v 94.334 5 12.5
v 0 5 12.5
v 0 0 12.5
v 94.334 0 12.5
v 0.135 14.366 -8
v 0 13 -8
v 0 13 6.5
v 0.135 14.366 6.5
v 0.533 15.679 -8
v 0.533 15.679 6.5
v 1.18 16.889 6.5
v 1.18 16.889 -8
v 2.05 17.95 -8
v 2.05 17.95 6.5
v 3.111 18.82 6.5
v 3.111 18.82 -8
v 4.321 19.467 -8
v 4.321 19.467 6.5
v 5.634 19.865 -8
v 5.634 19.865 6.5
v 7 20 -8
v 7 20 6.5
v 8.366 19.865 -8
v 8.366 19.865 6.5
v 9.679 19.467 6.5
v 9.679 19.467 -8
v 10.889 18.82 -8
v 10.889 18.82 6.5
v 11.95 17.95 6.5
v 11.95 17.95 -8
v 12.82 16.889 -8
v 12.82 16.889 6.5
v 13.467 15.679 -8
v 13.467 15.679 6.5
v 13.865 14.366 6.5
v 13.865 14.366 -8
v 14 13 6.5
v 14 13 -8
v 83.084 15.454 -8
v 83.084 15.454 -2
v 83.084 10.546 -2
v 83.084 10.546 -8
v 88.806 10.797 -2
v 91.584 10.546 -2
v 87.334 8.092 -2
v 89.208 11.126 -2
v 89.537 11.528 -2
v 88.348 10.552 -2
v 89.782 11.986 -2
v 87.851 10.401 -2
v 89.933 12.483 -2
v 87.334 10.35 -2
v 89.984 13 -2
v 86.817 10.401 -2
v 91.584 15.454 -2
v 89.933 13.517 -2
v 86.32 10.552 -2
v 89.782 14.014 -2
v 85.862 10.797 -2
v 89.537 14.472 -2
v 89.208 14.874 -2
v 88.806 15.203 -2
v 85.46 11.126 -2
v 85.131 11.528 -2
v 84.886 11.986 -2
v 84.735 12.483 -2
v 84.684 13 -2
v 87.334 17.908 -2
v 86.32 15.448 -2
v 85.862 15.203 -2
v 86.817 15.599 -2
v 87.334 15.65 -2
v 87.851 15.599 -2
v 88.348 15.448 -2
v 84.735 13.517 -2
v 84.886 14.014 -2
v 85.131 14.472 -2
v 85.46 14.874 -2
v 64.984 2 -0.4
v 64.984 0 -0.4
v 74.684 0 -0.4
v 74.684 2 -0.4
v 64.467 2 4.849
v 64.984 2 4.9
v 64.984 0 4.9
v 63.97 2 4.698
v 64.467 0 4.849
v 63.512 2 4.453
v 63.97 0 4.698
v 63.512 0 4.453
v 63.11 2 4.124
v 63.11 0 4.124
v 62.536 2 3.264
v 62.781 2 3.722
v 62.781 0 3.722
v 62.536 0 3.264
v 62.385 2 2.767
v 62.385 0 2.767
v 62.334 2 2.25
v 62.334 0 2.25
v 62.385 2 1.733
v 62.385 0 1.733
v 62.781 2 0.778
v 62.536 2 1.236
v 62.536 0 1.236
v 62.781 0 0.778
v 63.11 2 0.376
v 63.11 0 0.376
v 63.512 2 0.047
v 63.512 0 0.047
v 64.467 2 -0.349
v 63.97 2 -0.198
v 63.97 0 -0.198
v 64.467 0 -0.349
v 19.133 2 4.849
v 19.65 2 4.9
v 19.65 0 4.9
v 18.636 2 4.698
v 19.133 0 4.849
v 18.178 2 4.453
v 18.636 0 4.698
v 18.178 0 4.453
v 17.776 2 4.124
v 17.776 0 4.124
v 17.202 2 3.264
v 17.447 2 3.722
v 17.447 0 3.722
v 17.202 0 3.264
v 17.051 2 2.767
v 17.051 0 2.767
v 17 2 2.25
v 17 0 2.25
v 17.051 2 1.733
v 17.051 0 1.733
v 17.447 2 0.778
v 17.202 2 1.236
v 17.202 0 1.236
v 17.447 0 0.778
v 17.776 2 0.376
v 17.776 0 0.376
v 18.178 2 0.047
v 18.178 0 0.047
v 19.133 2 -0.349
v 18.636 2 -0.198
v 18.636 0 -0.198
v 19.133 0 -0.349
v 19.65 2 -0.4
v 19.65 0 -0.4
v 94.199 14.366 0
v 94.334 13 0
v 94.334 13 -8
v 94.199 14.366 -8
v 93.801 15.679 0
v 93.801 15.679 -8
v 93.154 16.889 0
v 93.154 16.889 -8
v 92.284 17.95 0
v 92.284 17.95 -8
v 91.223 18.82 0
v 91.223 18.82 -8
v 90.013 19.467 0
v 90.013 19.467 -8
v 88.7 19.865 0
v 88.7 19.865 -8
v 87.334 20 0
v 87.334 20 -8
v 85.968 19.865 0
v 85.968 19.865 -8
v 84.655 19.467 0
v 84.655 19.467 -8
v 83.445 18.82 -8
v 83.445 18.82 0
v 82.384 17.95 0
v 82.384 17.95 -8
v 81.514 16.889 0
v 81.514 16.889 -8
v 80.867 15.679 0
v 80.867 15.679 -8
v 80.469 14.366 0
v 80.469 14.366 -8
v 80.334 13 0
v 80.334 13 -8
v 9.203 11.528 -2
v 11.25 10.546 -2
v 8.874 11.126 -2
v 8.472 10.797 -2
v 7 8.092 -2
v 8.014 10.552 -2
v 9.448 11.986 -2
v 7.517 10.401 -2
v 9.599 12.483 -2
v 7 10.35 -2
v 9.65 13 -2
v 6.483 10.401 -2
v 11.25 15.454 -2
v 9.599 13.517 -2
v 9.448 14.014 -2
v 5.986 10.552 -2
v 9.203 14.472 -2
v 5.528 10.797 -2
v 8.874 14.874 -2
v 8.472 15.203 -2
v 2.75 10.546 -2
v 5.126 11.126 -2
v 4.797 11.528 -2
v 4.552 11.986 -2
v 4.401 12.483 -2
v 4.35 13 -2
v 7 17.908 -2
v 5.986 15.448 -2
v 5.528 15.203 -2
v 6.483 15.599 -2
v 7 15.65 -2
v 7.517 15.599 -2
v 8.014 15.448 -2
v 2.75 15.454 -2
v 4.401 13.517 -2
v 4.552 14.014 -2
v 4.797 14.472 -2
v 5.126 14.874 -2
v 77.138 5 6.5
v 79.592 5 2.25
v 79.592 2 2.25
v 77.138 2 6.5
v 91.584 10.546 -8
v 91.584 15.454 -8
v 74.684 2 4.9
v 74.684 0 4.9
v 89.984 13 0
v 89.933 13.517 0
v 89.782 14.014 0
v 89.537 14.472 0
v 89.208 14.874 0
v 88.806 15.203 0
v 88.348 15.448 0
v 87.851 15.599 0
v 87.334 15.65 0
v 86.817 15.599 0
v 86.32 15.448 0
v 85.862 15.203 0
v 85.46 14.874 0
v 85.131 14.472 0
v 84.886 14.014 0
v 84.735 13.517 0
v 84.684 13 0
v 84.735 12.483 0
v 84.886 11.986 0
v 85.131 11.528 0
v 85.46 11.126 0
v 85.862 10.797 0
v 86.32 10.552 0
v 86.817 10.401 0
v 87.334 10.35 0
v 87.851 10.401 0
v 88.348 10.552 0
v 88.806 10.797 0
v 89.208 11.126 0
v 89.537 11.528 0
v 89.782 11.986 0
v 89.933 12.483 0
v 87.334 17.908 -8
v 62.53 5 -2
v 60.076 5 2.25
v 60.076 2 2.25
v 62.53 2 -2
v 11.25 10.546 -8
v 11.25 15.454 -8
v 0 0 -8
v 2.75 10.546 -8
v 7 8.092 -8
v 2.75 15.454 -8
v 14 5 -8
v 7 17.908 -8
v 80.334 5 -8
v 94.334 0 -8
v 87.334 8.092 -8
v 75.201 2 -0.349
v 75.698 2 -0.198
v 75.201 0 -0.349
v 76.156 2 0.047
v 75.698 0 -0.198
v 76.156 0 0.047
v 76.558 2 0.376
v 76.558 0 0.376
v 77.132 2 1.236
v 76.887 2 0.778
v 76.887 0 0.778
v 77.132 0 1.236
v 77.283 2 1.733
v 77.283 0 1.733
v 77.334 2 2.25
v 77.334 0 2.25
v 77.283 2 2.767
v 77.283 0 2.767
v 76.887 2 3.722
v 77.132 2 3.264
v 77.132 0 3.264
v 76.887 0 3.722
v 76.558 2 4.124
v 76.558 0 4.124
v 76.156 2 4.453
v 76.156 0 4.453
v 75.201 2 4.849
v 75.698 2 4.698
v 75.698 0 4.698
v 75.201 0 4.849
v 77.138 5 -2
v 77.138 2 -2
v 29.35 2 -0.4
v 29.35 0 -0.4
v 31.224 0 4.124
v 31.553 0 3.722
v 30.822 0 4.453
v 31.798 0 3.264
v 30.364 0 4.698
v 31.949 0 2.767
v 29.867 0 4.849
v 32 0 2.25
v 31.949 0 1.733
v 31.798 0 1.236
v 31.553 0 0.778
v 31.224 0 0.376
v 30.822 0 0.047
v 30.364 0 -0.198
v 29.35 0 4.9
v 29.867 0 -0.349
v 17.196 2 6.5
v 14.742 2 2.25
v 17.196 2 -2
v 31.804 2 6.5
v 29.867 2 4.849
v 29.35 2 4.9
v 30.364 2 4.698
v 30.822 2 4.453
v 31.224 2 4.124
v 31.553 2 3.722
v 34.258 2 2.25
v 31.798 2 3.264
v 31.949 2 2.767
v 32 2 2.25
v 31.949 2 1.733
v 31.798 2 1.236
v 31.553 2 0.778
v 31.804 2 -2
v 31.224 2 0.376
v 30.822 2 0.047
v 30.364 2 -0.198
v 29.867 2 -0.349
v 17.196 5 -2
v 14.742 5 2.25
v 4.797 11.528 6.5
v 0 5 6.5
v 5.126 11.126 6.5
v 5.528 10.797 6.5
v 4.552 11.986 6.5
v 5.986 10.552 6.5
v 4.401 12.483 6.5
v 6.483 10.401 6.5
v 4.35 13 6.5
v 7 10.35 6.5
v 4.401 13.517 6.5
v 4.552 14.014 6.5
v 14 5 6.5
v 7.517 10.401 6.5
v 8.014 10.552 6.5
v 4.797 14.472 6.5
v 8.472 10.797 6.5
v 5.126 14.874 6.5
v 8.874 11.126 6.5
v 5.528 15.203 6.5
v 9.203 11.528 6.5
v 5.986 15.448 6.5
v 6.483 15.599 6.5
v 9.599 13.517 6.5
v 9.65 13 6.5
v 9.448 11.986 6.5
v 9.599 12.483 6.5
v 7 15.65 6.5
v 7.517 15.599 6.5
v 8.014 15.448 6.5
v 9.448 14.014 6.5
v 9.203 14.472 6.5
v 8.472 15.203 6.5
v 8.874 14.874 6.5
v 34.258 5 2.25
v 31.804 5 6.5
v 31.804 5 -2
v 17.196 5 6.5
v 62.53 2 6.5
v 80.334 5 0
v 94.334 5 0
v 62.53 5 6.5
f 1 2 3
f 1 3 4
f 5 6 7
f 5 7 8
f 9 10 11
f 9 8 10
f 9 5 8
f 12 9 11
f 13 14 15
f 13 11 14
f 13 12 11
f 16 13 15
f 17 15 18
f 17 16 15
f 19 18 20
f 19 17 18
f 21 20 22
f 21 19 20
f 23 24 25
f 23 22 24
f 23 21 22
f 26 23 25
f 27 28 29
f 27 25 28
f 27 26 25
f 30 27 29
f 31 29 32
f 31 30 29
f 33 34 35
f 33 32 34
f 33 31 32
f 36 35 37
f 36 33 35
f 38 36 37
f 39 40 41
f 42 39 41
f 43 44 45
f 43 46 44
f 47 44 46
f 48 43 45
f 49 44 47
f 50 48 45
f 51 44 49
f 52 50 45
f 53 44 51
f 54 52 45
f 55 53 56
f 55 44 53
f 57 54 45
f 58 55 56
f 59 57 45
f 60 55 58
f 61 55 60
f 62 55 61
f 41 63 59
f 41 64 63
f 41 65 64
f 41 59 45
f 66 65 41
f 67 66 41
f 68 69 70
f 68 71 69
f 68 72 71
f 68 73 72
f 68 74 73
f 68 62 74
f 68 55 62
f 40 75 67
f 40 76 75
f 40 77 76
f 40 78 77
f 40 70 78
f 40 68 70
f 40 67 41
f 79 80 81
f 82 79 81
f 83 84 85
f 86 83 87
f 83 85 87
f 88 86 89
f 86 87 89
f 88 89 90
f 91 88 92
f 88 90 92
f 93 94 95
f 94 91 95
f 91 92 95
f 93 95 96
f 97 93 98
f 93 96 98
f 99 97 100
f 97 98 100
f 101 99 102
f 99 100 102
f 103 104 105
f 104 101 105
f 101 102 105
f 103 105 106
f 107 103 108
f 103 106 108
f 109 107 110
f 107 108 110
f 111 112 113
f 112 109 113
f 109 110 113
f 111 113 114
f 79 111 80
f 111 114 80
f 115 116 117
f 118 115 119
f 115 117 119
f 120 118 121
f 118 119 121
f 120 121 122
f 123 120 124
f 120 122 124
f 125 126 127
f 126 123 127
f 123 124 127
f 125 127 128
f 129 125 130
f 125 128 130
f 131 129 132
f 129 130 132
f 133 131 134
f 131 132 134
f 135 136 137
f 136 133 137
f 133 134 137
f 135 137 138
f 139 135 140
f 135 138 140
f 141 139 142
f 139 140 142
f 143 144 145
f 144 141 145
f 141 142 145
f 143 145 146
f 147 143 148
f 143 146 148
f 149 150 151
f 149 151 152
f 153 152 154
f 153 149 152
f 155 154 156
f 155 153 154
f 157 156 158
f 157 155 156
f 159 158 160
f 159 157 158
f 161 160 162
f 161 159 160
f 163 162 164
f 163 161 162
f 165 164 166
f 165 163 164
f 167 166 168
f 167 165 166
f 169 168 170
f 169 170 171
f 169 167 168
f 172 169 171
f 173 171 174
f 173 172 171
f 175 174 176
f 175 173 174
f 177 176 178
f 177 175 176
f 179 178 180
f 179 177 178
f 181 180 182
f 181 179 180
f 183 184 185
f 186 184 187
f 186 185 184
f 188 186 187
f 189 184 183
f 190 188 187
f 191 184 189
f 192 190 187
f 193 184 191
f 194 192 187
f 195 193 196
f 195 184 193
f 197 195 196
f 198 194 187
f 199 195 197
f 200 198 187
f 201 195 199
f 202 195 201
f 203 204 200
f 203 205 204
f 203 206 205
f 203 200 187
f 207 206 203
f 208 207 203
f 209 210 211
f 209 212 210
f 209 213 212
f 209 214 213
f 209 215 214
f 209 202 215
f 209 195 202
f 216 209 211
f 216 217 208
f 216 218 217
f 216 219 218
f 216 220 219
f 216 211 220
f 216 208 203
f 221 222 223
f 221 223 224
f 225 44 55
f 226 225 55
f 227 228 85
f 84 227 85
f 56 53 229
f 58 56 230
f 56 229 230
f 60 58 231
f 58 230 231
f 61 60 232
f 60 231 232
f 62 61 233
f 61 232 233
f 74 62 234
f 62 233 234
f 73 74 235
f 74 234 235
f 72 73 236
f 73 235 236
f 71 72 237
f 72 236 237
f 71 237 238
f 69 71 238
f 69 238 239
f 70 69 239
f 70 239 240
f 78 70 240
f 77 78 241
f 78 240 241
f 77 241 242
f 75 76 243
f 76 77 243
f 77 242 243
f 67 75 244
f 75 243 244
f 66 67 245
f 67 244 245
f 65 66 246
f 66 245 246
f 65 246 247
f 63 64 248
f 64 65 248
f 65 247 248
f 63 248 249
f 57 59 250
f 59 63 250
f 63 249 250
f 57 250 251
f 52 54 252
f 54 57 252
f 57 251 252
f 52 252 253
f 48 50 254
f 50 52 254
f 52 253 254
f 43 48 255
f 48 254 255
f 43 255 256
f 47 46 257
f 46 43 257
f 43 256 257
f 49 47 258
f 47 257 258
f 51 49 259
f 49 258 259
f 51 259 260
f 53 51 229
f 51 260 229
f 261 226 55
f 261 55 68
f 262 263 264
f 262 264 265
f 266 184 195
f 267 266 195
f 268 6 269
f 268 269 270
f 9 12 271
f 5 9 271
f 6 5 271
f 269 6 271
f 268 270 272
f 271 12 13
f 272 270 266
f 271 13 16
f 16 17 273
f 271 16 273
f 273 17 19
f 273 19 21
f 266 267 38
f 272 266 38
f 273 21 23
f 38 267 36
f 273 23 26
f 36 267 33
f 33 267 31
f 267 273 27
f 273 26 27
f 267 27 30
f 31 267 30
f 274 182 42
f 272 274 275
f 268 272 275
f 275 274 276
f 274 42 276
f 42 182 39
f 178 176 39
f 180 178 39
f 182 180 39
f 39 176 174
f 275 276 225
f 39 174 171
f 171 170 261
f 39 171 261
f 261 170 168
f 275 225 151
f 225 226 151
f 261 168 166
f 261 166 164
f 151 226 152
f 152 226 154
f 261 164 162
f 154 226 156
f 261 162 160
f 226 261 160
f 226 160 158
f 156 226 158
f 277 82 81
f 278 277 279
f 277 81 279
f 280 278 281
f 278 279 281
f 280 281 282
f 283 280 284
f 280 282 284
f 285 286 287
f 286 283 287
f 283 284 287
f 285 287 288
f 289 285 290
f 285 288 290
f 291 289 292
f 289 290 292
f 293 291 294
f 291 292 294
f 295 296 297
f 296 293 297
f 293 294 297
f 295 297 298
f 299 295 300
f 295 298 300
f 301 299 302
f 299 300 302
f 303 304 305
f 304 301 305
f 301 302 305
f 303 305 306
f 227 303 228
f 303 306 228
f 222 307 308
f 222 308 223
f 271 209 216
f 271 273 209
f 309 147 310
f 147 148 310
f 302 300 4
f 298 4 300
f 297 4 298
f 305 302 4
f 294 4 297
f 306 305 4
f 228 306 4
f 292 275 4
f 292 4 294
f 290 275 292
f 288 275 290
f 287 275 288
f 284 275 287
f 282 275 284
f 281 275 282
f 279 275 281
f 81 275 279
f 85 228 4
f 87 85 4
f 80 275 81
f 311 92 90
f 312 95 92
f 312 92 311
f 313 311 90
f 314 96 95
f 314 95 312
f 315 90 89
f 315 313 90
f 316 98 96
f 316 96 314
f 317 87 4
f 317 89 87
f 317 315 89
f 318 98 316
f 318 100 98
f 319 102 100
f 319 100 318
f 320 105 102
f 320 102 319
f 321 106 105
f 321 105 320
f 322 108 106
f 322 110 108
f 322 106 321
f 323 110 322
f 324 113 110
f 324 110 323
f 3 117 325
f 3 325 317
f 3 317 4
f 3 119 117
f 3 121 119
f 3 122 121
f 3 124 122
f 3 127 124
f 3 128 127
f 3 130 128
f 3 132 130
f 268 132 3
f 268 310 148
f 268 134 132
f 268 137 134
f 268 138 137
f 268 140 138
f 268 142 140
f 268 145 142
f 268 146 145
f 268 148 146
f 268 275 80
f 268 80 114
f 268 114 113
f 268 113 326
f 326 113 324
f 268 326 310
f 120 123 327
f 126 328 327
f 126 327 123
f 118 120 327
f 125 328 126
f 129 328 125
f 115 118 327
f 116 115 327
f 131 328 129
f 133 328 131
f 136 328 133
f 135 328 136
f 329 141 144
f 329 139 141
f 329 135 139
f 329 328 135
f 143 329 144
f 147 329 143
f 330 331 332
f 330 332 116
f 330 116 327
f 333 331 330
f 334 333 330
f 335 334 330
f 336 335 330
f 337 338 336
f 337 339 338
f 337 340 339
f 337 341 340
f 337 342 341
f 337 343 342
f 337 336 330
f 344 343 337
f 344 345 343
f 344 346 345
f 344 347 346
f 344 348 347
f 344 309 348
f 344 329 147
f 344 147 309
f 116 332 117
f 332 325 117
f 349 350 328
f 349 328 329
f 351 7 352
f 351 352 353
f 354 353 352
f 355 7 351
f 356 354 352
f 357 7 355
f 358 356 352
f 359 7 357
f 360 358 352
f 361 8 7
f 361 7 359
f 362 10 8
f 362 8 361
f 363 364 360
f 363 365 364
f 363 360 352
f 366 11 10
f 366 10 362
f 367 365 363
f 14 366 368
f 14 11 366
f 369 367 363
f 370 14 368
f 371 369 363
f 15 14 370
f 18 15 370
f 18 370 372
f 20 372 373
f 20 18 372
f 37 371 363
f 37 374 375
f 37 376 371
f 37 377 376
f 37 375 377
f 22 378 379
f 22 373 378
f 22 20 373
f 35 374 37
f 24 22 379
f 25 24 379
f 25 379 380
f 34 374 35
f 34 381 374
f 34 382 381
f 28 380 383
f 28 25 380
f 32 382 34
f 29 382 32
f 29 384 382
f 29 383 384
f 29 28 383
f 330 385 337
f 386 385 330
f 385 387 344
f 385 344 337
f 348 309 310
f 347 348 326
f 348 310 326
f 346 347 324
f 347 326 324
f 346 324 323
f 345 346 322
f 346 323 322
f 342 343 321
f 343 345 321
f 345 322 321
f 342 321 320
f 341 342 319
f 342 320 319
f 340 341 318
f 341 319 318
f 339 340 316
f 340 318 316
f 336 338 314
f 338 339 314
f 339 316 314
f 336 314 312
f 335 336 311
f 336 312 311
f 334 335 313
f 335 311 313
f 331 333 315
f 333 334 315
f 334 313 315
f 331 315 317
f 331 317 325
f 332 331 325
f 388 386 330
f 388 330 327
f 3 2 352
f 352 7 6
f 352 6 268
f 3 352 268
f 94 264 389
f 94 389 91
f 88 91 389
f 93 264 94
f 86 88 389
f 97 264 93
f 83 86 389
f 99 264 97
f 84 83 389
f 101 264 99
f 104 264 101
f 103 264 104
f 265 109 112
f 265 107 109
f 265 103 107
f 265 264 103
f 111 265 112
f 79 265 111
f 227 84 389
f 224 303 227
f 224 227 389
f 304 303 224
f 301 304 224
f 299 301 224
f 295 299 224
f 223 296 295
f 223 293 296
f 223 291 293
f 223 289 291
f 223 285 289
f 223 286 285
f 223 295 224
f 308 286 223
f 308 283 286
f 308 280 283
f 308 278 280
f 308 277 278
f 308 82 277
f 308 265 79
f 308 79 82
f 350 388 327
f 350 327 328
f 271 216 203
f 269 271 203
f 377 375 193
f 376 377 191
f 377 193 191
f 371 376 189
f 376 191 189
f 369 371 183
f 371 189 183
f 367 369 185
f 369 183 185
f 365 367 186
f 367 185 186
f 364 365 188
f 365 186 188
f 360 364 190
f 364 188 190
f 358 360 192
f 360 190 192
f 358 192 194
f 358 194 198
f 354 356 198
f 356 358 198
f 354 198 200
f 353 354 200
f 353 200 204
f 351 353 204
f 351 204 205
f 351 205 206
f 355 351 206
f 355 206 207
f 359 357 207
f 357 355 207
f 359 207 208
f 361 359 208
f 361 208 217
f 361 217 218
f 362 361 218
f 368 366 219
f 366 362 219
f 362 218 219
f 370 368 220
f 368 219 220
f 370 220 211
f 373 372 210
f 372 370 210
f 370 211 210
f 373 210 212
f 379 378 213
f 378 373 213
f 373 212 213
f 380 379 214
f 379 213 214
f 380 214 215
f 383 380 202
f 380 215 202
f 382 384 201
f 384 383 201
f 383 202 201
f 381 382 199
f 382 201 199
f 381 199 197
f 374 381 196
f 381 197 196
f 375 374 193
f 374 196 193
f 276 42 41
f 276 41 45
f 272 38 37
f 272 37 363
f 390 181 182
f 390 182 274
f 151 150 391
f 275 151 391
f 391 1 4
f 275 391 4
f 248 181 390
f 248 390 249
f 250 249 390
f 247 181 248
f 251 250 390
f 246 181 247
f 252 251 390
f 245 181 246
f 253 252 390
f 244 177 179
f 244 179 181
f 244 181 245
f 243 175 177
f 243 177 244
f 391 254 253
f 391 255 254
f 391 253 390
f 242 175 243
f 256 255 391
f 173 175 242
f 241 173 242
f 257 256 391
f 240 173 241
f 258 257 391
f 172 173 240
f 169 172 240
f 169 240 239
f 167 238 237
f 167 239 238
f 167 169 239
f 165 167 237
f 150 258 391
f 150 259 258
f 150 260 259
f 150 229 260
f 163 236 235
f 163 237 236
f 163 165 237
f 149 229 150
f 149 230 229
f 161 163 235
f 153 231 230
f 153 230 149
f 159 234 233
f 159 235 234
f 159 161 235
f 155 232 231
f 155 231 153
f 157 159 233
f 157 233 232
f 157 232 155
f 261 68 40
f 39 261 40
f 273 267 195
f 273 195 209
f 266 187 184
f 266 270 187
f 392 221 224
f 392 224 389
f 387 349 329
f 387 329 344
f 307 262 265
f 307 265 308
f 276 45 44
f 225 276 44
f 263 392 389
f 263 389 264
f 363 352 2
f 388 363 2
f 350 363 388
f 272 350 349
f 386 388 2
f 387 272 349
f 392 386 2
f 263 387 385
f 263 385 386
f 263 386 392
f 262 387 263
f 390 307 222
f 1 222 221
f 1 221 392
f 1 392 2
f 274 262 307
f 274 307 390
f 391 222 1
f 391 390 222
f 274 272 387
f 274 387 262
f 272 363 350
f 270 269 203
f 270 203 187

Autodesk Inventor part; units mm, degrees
ref_plane "YZ Plane" through (0, 0, 0) normal (1, 0, 0) x (0, 1, 0)
ref_plane "XZ Plane" through (0, 0, 0) normal (0, 1, 0) x (-1, 0, 0)
ref_plane "XY Plane" through (0, 0, 0) normal (0, 0, 1) x (1, 0, 0)
sketch "Skizze1" plane through (0, 0, 0) normal (0, 0, 1) x (1, 0, 0)
  circle A0 centre (7, 13) radius 2.65
  circle A1 centre (87.334, 13) radius 2.65
  arc A2 (14, 13) -> (0, 13) centre (7, 13) ccw
  arc A3 (94.334, 13) -> (80.334, 13) centre (87.334, 13) ccw
  line L0 (94.334, 0) -> (0, 0)
  line L1 (0, 5) -> (94.334, 5)
  line L2 (94.334, 13) -> (94.334, 0)
  line L3 (80.334, 13) -> (80.334, 5)
  line L4 (14, 13) -> (14, 5)
  line L5 (0, 13) -> (0, 0)
  dimension "d4" = 5.3
  dimension "d5" = 5.3
  dimension "d8" = 80.334
  dimension "d18" = 5
  dimension "d21" = 7
  dimension "d22" = 13
extrude "Extrusion1" add sketch "Skizze1" along normal blind 12.5 and the other way blind 8 contours L1 L2 L0 L5
extrude "Extrusion2" add sketch "Skizze1" against normal blind 8 contours L3 A3 L2 L1
extrude "Extrusion3" add sketch "Skizze1" along normal blind 6.5 and the other way blind 8 contours L4 L1 L5 A2
sketch "Skizze2" plane through (0, 0, -8) normal (0, 0, -1) x (-1, 0, 0)
  circle A0 centre (-87.334, 13) radius 2.65 projected
  circle A1 centre (-7, 13) radius 2.65 projected
  line L0 (-87.334, 17.9075) -> (-83.084, 15.4537)
  line L1 (-83.084, 15.4537) -> (-83.084, 10.5463)
  line L2 (-83.084, 10.5463) -> (-87.334, 8.0925)
  line L3 (-87.334, 8.0925) -> (-91.584, 10.5463)
  line L4 (-91.584, 10.5463) -> (-91.584, 15.4537)
  line L5 (-91.584, 15.4537) -> (-87.334, 17.9075)
  line L6 (-7, 17.9075) -> (-2.75, 15.4537)
  line L7 (-2.75, 15.4537) -> (-2.75, 10.5463)
  line L8 (-2.75, 10.5463) -> (-7, 8.0925)
  line L9 (-7, 8.0925) -> (-11.25, 10.5463)
  line L10 (-11.25, 10.5463) -> (-11.25, 15.4537)
  line L11 (-11.25, 15.4537) -> (-7, 17.9075)
  point P0 (0, 0)
  dimension "d23" = 8.5
  dimension "d24" = 8.5
extrude "Extrusion4" cut sketch "Skizze2" against normal blind 6 contours L0 L1 L2 L3 L4 L5
extrude "Extrusion5" cut sketch "Skizze2" against normal blind 6 contours A1 | L6 L7 L8 L9 L10 L11
sketch "Skizze3" plane through (0, 0, 12.5) normal (0, -1, 0) x (1, 0, 0)
  line L0 (94.334, 0) -> (94.334, -20.5) projected
  line L1 (0, 0) -> (94.334, 0) projected
  line L2 (0, -20.5) -> (0, 0) projected
  line L3 (94.334, -20.5) -> (0, -20.5) projected
  line L4 (0, -20.5) -> (0, 0) projected
  line L5 (0, -10.25) -> (94.334, -10.25) construction
  line L6 (94.334, 0) -> (94.334, -20.5) projected
  line L7 (17, -10.25) -> (32, -10.25) construction
  line L8 (19.65, -12.9) -> (29.35, -12.9)
  line L9 (29.35, -7.6) -> (19.65, -7.6)
  arc A0 (19.65, -7.6) -> (19.65, -12.9) centre (19.65, -10.25) ccw
  arc A1 (29.35, -12.9) -> (29.35, -7.6) centre (29.35, -10.25) ccw
  line L10 (62.334, -10.25) -> (77.334, -10.25) construction
  line L11 (64.984, -12.9) -> (74.684, -12.9)
  line L12 (74.684, -7.6) -> (64.984, -7.6)
  arc A2 (64.984, -7.6) -> (64.984, -12.9) centre (64.984, -10.25) ccw
  arc A3 (74.684, -12.9) -> (74.684, -7.6) centre (74.684, -10.25) ccw
  point P0 (0, -12.5)
  point P1 (24.5, -10.25)
  point P2 (69.834, -10.25)
  dimension "d34" = 5.3
  dimension "d35" = 5.3
  dimension "d36" = 15
  dimension "d37" = 15
  dimension "d38" = 17
  dimension "d39" = 17
extrude "Extrusion6" cut sketch "Skizze3" against normal through all contours A0 L9 A1 L8 | A2 L12 A3 L11
sketch "Skizze4" plane through (0, 5, 12.5) normal (0, 1, 0) x (1, 0, 0)
  line L0 (74.684, 7.6) -> (64.984, 7.6) projected
  arc A0 (64.984, 12.9) -> (64.984, 7.6) centre (64.984, 10.25) ccw projected
  line L1 (64.984, 12.9) -> (74.684, 12.9) projected
  arc A1 (74.684, 7.6) -> (74.684, 12.9) centre (74.684, 10.25) ccw projected
  line L2 (29.35, 7.6) -> (19.65, 7.6) projected
  arc A2 (19.65, 12.9) -> (19.65, 7.6) centre (19.65, 10.25) ccw projected
  line L3 (19.65, 12.9) -> (29.35, 12.9) projected
  arc A3 (29.35, 7.6) -> (29.35, 12.9) centre (29.35, 10.25) ccw projected
  line L4 (14, 6) -> (0, 6) projected
  line L5 (0, 6) -> (0, 0) projected
  line L6 (94.334, 0) -> (0, 0) projected
  line L7 (94.334, 12.5) -> (94.334, 0) projected
  line L8 (94.334, 12.5) -> (80.334, 12.5) projected
  line L9 (80.334, 12.5) -> (80.334, 20.5) projected
  line L10 (14, 20.5) -> (80.334, 20.5) projected
  line L11 (14, 20.5) -> (14, 6) projected
  line L12 (77.1378, 6) -> (72.2303, 6)
  line L13 (72.2303, 6) -> (69.7765, 10.25)
  line L14 (69.7765, 10.25) -> (72.2303, 14.5)
  line L15 (72.2303, 14.5) -> (77.1378, 14.5)
  line L16 (77.1378, 14.5) -> (79.5915, 10.25)
  line L17 (79.5915, 10.25) -> (77.1378, 6)
  line L18 (62.5303, 6) -> (60.0765, 10.25)
  line L19 (60.0765, 10.25) -> (62.5303, 14.5)
  line L20 (62.5303, 14.5) -> (67.4378, 14.5)
  line L21 (67.4378, 14.5) -> (69.8915, 10.25)
  line L22 (69.8915, 10.25) -> (67.4378, 6)
  line L23 (67.4378, 6) -> (62.5303, 6)
  line L24 (31.8037, 6) -> (26.8963, 6)
  line L25 (26.8963, 6) -> (24.4425, 10.25)
  line L26 (24.4425, 10.25) -> (26.8963, 14.5)
  line L27 (26.8963, 14.5) -> (31.8037, 14.5)
  line L28 (31.8037, 14.5) -> (34.2575, 10.25)
  line L29 (34.2575, 10.25) -> (31.8037, 6)
  line L30 (17.1963, 6) -> (14.7425, 10.25)
  line L31 (14.7425, 10.25) -> (17.1963, 14.5)
  line L32 (17.1963, 14.5) -> (22.1037, 14.5)
  line L33 (22.1037, 14.5) -> (24.5575, 10.25)
  line L34 (24.5575, 10.25) -> (22.1037, 6)
  line L35 (22.1037, 6) -> (17.1963, 6)
  line L36 (72.2303, 6) -> (67.4378, 6)
  line L37 (74.684, 7.6) -> (64.984, 7.6) projected
  line L38 (72.2303, 14.5) -> (67.4378, 14.5)
  line L39 (26.8963, 6) -> (22.1037, 6)
  line L40 (26.8963, 14.5) -> (22.1037, 14.5)
  point P0 (0, 12.5)
  dimension "d42" = 8.5
extrude "Extrusion7" cut sketch "Skizze4" against normal blind 3 contours A1 L1 L14 L15 L16 L17 L12 L13 L0 | L13 L36 L22 L0 | L22 L23 L18 L19 L20 L21 L1 A0 L0 | L1 L21 L38 L14 | A3 L3 L26 L27 L28 L29 L24 L25 L2 | L25 L39 L34 L2 | L34 L35 L30 L31 L32 L33 L3 A2 L2 | L3 L33 L40 L26
equation "\"d4\" = d5"
equation "\"d10\" = d14"
equation "\"d29\" = d14"
equation "\"d24\" = d23"
equation "\"d35\" = d34"
equation "\"d37\" = d36"
equation "\"d14\" = 8"
properties part number "Door_Panel" material "ABS-Kunststoff"
